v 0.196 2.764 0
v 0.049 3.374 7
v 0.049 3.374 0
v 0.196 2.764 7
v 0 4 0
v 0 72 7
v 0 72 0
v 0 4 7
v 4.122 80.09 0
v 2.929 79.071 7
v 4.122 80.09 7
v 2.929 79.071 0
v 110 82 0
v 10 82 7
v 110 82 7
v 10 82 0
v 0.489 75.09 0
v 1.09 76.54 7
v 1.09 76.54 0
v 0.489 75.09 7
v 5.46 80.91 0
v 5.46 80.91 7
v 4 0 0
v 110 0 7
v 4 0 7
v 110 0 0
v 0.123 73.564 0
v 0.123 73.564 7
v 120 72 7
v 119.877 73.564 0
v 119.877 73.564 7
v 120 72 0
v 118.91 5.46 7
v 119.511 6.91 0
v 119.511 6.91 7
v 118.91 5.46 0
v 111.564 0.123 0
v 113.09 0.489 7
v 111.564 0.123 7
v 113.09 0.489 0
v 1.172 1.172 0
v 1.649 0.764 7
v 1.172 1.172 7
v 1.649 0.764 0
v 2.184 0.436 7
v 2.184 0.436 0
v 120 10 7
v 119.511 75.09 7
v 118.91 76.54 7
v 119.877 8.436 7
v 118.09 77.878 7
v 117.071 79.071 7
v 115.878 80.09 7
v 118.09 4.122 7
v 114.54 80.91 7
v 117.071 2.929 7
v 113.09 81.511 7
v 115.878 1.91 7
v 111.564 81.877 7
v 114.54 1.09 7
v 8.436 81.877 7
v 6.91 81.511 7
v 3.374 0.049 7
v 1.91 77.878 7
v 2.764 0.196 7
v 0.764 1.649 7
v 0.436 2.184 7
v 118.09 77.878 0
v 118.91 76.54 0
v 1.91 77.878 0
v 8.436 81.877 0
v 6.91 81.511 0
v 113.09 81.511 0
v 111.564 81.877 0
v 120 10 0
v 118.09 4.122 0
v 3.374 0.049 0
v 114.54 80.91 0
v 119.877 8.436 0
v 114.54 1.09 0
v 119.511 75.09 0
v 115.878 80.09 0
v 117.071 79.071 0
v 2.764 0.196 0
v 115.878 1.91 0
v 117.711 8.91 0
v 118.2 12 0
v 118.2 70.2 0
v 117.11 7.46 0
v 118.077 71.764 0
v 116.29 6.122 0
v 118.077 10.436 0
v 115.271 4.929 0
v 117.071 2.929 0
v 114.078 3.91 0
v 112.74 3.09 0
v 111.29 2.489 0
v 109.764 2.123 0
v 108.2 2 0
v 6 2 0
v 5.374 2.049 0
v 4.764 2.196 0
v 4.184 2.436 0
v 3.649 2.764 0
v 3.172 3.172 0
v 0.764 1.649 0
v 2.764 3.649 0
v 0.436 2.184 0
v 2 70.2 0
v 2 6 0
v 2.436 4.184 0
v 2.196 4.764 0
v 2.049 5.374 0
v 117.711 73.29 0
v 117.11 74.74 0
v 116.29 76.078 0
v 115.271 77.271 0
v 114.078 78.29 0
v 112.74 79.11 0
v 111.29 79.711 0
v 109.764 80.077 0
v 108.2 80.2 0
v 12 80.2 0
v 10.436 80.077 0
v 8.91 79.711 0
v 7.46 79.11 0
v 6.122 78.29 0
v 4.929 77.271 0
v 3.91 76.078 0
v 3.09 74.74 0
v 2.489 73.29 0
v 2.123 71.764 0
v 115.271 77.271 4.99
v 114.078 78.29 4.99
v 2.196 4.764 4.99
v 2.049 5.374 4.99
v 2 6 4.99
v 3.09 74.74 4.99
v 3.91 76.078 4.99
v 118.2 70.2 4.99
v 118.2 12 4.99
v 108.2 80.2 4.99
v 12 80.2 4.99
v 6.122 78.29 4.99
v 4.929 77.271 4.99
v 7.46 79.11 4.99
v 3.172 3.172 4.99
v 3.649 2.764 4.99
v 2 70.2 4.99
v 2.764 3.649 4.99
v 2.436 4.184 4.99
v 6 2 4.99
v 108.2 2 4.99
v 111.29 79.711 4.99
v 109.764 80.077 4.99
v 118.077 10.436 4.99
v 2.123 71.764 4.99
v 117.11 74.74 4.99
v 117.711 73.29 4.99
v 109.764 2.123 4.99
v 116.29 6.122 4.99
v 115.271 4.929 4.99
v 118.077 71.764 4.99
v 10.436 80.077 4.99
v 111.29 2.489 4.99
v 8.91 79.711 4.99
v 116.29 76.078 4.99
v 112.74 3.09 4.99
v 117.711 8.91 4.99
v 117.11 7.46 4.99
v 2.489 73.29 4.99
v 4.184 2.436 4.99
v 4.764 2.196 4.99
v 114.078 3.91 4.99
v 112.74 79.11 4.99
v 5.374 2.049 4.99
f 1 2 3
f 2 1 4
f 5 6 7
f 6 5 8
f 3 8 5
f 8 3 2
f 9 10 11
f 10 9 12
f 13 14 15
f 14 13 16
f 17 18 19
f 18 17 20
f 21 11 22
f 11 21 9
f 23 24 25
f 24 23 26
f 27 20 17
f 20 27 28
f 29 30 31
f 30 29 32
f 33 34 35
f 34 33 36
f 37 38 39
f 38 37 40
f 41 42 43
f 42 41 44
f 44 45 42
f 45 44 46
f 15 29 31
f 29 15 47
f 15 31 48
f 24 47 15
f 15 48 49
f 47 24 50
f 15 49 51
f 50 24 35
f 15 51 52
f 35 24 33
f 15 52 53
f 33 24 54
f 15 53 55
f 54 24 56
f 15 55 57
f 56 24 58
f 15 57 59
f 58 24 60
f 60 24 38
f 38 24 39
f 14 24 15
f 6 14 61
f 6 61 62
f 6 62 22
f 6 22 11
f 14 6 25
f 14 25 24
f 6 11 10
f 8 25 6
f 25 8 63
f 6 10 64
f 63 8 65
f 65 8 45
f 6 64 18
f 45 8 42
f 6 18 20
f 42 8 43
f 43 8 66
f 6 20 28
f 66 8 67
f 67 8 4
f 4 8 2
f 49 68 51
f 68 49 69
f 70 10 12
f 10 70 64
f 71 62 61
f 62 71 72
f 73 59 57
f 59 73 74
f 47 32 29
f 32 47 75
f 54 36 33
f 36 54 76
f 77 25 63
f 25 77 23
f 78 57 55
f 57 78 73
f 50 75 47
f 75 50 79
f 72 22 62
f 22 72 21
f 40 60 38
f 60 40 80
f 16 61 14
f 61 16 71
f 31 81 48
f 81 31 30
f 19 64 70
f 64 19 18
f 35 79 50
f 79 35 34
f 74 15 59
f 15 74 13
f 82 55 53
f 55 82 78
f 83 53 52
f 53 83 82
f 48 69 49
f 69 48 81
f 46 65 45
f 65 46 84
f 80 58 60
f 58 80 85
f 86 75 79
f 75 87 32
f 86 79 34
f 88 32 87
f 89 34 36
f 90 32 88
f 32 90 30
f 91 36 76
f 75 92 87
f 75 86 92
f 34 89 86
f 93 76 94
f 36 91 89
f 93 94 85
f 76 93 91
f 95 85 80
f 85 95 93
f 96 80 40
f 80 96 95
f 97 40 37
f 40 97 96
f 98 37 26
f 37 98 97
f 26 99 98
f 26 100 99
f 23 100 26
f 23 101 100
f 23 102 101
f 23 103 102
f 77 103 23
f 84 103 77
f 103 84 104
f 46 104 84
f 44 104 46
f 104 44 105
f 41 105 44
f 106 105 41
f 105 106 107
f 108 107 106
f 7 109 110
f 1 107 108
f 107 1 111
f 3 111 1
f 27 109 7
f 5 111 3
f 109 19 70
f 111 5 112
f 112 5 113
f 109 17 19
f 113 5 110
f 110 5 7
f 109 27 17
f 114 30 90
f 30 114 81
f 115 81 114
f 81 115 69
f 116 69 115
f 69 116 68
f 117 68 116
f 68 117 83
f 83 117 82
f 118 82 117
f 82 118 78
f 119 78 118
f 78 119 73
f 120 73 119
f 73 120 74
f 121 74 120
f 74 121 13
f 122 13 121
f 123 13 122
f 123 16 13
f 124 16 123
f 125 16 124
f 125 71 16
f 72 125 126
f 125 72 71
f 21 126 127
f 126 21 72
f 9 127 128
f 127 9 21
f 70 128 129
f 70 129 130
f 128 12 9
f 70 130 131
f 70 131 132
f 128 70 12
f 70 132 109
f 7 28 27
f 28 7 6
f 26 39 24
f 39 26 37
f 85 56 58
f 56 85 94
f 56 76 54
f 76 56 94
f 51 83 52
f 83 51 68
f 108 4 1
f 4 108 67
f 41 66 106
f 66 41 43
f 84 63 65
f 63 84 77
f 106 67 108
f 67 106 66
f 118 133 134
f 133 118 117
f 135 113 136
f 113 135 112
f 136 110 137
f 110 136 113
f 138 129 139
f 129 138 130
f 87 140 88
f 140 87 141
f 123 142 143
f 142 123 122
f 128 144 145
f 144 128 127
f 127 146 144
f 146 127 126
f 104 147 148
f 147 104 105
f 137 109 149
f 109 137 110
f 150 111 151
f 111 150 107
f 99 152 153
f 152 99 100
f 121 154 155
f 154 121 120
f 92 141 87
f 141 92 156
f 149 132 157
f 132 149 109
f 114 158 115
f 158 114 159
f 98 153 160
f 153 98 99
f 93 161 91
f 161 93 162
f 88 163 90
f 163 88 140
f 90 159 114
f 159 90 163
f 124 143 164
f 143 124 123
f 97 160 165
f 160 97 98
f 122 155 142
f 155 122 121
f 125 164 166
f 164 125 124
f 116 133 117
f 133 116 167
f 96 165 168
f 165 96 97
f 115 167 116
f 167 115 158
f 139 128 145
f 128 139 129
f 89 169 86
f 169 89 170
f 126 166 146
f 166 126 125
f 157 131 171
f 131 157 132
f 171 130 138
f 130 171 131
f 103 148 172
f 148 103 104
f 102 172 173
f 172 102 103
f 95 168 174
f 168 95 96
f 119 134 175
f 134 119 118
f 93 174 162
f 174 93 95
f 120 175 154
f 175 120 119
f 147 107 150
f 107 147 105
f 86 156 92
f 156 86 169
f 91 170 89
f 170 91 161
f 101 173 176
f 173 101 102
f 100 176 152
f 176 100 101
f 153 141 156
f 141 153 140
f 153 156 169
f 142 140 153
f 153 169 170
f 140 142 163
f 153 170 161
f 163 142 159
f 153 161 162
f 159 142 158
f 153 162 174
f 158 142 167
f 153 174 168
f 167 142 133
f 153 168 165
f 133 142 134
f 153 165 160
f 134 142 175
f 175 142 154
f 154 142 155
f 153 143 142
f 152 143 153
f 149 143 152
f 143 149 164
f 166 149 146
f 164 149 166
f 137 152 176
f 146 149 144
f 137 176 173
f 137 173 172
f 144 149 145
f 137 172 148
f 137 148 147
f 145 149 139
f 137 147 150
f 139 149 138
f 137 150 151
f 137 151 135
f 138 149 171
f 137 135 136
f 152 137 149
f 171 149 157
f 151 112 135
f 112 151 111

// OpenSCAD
//
// Customizable Curd Cover
//

/* [Dimensions] */
// Natural vs. printable rendering of the object
FlipOver=0; // [0:no,1:yes]
// The x-dimension of the actual container to cover
CoverLength=116.0;
// The y-dimension of the actual container to cover
CoverWidth=78.0;
// The inner height of the cover that we are creating
CoverHeight=5.0;
// The wall thickness of the resulting cover
CoverThickness=2.0;
// The diameter of the lower left corner of the container to cover
LowerLeftCornerDiameter=8.0;
// The diameter of the lower right corner of the container to cover
LowerRightCornerDiameter=20.0;
// The diameter of the upper right corner of the container to cover
UpperRightCornerDiameter=20.0;
// The diameter of the upper left corner of the container to cover
UpperLeftCornerDiameter=20.0;
// The amount of oversizing of the resulting cover - less is tighter
Tolerance=0.2; // [0:0.05:0.5]
// How fine / coarse do you want to render the model
Resolution=40; // [12:120]

/* [Hidden] */
$fn       = Resolution;
flip      = (FlipOver!=0);

//
// Example data for a few brands
//

// Brand: Mark Brandenburg
// size      = [  87.0, 98.0 ];
// d         = [ [ 20.0, 20.0 ],
//               [  8.0, 20.0 ] ];

// Brand: milfina Hochwald Foods
// size      = [  116.0, 78.0 ];
// d         = [ [ 20.0, 20.0 ],
//               [  8.0, 20.0 ] ];

size      = [  CoverLength, CoverWidth ];
d         = [ [ UpperLeftCornerDiameter, UpperRightCornerDiameter ],
              [ LowerLeftCornerDiameter, LowerRightCornerDiameter ] ];

h         = CoverHeight;
w         = CoverThickness;
tolerance = Tolerance;


module lid_surface(oversize) {
    hull() {
        // Lower left corner
        translate([d[1][0]/2, d[1][0]/2, 0]) circle(d = d[1][0]);
        
        // Lower right corner
        translate([size[0]+oversize-(d[1][1]/2), d[1][1]/2, 0]) circle(d = d[1][1]);
        
        // Upper right corner
        translate([size[0]+oversize-(d[0][1]/2), size[1]+oversize-(d[0][1]/2), 0]) circle(d = d[0][1]);
        
        // Upper left corner
        translate([d[0][0]/2, size[1]+oversize-(d[0][0]/2), 0]) circle(d = d[0][0]);
    }
}

module curd_cover() {
    difference() {
        linear_extrude(height = h+w) lid_surface(2*w);
        translate([w, w, -0.01])
            linear_extrude(height = h) lid_surface(tolerance);
    }
}

if(flip) {
    translate([(size[0]+2*w), 0, h+w]) rotate([0, 180, 0]) curd_cover();
} else {
    curd_cover();
}
